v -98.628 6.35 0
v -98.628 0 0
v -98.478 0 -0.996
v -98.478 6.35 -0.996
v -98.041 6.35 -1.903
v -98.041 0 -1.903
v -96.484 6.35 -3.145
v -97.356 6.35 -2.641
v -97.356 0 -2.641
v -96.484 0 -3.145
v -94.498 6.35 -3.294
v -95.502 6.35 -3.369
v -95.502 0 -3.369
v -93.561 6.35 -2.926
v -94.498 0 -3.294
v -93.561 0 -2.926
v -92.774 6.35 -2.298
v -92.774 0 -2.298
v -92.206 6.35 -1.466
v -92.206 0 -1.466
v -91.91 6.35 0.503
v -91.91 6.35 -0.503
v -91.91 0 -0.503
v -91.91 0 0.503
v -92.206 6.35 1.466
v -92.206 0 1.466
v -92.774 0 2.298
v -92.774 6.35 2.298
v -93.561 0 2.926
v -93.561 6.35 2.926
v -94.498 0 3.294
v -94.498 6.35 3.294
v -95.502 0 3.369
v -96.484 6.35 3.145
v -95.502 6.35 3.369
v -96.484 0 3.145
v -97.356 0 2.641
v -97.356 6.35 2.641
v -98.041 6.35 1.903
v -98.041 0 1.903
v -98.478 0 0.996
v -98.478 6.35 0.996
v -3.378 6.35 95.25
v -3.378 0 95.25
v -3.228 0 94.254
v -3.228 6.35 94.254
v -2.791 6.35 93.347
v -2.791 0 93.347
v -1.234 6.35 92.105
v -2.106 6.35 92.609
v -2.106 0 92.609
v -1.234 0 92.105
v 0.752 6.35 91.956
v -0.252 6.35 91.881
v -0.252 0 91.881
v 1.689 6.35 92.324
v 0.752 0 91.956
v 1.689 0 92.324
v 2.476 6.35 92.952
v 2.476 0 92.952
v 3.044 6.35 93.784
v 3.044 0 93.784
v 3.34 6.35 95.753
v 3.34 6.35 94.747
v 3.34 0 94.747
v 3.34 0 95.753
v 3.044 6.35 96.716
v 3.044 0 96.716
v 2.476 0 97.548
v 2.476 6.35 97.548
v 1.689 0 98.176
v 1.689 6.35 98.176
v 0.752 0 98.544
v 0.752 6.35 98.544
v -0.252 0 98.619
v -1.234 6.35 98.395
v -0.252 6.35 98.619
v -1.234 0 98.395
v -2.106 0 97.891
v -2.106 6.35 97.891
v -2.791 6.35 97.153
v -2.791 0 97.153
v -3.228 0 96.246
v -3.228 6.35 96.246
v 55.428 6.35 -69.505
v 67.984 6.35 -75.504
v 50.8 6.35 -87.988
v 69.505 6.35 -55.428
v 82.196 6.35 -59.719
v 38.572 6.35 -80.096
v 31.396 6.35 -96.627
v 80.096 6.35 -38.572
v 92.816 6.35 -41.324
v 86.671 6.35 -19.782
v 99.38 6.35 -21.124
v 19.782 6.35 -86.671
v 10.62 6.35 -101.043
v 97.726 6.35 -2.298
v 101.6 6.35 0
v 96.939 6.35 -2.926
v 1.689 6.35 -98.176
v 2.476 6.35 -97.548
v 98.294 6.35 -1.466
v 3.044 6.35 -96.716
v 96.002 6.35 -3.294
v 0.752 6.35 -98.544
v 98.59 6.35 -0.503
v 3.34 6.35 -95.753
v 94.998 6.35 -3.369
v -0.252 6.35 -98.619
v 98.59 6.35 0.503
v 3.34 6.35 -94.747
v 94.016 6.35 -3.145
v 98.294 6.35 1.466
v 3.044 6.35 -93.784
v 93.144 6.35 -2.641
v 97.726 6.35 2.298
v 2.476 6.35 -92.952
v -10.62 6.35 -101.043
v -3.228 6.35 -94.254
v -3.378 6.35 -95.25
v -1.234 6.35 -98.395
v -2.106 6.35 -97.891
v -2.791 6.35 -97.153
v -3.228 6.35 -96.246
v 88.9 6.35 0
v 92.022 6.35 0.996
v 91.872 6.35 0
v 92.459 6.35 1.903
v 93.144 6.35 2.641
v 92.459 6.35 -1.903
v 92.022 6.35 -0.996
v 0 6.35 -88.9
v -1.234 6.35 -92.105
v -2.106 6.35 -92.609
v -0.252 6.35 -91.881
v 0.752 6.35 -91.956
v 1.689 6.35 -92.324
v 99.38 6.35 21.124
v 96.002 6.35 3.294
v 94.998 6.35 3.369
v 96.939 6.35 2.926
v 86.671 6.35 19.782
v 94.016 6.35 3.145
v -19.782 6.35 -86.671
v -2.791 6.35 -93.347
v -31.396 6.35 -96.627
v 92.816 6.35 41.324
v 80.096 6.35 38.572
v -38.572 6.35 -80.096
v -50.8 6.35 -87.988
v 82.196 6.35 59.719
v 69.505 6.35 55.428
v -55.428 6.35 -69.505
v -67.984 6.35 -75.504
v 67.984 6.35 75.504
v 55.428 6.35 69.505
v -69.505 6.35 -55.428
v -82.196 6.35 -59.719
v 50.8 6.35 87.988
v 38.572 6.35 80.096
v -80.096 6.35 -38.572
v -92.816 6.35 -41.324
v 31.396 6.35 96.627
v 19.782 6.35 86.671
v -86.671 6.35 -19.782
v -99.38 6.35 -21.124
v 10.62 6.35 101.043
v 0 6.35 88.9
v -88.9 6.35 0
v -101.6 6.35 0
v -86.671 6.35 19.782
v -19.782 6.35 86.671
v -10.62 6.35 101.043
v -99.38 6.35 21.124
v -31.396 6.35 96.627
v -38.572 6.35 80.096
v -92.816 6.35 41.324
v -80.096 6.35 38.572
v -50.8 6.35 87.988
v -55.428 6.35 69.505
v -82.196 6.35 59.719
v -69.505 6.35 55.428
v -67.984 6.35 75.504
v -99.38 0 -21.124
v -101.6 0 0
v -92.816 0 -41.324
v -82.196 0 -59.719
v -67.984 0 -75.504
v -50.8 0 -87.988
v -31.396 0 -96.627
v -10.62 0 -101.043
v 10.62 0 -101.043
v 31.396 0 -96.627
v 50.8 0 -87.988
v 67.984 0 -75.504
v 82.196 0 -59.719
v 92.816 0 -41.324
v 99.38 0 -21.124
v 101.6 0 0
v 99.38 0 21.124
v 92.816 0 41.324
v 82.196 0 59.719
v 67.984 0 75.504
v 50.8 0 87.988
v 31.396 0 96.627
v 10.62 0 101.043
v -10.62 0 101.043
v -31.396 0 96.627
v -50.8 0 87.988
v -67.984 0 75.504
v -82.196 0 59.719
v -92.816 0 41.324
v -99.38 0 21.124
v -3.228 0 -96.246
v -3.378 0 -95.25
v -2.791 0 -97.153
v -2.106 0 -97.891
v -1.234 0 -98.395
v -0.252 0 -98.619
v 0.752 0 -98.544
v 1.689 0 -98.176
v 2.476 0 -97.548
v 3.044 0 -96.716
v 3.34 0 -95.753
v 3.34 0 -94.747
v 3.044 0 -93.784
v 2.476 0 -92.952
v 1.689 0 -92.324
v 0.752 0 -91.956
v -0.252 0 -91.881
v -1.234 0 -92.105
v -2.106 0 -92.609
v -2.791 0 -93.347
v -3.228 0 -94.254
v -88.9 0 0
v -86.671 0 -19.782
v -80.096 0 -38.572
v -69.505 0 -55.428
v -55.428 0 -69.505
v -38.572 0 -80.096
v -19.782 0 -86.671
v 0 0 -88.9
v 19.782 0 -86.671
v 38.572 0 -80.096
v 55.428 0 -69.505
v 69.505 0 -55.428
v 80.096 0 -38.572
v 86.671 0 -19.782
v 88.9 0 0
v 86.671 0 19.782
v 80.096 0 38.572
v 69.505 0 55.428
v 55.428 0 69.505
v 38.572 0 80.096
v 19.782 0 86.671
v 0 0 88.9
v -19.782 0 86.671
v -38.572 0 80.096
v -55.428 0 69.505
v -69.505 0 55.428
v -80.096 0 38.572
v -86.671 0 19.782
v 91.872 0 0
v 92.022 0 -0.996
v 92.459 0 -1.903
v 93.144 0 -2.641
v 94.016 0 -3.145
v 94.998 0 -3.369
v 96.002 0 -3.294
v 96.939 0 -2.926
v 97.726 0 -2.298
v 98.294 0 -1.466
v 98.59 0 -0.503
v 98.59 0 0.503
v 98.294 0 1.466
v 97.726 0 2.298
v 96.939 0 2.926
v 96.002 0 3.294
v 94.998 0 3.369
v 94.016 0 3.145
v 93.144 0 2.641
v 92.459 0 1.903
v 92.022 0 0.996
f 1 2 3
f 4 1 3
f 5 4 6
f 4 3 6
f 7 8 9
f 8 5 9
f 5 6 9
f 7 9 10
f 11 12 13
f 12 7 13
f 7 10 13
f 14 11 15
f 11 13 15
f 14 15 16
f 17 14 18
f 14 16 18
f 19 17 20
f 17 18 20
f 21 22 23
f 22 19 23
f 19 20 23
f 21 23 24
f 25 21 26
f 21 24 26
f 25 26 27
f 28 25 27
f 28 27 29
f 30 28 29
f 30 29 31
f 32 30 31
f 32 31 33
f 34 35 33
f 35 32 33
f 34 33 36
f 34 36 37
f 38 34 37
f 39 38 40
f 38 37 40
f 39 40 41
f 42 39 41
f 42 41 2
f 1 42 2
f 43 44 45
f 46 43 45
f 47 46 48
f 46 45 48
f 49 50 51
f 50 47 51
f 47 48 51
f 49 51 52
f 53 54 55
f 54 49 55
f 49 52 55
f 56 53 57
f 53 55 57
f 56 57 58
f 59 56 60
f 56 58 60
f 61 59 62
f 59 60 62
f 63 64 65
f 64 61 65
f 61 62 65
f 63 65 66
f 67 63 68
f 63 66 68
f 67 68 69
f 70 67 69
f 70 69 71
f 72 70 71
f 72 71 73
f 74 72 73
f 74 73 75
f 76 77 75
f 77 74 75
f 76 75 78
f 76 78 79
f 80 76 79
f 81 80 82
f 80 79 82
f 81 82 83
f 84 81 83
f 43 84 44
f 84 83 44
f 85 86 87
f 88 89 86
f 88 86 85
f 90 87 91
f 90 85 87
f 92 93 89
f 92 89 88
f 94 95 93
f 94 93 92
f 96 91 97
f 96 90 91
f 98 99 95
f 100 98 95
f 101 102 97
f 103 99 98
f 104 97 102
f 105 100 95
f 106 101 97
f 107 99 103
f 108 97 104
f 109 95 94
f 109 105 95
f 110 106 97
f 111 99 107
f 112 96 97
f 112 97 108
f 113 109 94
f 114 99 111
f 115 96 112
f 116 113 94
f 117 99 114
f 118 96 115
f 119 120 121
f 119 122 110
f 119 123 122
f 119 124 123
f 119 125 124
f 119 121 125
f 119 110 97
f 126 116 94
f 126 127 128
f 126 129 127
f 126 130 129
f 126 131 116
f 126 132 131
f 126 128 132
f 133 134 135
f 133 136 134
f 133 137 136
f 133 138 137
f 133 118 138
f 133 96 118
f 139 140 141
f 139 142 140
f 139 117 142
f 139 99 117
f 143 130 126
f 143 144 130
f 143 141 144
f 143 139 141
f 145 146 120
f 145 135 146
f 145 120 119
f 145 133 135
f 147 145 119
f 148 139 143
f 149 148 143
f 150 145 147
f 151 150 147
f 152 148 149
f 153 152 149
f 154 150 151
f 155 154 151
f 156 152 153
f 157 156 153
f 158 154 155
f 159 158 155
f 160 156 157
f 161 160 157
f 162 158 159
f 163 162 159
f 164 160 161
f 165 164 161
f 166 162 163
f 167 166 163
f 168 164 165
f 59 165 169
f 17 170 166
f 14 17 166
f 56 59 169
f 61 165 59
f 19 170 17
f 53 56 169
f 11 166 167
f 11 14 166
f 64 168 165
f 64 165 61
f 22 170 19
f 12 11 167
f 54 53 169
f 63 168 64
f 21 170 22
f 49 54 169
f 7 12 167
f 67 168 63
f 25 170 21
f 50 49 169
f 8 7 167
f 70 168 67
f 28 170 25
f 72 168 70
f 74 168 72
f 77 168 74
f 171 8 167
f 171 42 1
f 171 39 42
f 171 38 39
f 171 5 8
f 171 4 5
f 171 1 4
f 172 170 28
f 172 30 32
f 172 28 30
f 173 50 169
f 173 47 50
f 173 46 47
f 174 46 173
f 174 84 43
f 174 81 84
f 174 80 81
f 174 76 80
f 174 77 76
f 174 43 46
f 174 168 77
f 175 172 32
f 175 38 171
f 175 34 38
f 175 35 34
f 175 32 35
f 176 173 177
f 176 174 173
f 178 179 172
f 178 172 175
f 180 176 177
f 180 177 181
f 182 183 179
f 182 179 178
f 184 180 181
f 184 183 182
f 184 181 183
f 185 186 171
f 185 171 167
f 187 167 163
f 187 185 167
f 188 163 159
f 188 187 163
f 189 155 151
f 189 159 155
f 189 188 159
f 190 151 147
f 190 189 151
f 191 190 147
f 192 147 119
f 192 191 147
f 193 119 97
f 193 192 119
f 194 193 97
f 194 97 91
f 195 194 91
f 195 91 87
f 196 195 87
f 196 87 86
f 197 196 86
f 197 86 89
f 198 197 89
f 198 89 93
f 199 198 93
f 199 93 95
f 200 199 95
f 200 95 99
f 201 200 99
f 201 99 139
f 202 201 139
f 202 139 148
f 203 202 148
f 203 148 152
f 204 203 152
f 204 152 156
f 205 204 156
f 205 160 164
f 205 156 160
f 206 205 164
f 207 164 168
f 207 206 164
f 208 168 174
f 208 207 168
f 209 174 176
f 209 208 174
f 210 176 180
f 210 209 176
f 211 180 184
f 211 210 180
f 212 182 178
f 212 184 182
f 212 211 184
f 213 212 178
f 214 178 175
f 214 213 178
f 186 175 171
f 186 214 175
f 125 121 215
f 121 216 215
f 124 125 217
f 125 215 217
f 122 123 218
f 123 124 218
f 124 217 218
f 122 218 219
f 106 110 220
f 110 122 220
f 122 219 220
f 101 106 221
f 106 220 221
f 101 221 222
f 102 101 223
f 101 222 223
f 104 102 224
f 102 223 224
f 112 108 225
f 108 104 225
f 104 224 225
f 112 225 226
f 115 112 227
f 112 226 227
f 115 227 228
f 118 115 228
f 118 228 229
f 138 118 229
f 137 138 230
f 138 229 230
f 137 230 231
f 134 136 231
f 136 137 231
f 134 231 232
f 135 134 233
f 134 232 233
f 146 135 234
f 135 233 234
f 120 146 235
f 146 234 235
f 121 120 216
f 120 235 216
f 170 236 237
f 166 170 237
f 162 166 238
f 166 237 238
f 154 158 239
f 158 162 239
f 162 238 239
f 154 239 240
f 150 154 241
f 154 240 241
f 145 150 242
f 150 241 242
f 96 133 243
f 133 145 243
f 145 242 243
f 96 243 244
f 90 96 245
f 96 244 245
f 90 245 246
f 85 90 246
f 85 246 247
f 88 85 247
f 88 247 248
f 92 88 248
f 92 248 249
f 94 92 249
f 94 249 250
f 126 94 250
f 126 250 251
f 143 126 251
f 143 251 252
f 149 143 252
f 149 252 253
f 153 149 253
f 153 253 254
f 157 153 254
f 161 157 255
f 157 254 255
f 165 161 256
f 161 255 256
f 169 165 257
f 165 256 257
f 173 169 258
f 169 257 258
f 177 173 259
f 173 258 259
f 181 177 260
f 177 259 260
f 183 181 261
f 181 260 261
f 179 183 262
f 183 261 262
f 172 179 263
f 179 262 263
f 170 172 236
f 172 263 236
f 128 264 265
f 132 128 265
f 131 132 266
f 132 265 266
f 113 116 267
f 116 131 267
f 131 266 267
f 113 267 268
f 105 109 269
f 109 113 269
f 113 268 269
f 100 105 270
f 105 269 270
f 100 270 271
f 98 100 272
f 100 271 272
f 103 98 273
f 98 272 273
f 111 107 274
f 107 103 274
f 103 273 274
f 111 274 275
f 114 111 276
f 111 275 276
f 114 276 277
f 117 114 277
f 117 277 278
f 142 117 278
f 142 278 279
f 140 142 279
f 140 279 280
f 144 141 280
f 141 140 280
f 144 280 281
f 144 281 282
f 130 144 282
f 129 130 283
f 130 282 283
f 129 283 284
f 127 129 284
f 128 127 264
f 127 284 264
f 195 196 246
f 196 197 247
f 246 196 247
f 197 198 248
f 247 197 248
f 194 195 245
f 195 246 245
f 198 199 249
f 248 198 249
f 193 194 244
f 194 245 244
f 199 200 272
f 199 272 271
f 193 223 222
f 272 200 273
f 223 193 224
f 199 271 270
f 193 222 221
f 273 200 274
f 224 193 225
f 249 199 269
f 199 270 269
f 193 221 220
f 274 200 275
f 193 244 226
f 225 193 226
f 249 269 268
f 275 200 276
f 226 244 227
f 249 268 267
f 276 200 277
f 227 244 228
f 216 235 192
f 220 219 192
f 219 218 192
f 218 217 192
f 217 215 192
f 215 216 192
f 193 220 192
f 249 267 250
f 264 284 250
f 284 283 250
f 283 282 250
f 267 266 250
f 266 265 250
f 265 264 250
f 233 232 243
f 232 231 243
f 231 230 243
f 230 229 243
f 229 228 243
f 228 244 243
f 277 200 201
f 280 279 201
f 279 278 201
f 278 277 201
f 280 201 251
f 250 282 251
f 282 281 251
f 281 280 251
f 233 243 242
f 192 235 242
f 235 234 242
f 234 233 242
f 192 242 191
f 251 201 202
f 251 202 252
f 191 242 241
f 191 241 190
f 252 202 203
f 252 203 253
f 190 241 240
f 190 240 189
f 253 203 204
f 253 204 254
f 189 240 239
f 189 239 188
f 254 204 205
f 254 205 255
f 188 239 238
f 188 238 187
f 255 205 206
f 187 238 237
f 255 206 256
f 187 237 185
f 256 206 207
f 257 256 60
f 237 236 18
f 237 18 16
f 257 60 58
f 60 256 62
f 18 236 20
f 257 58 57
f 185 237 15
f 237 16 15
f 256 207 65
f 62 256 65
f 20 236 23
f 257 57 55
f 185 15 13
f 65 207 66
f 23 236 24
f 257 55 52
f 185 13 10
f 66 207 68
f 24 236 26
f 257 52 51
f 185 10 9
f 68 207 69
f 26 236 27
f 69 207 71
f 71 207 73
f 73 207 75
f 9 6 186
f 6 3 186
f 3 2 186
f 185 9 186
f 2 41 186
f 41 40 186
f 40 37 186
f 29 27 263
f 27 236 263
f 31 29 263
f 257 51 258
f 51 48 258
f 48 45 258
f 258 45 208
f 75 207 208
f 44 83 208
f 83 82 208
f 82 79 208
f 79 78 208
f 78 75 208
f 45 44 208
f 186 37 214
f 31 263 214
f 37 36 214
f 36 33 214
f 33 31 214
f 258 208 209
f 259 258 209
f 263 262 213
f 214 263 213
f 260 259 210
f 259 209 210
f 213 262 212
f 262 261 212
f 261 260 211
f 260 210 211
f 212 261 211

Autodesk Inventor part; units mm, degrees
ref_plane "YZ Plane" through (0, 0, 0) normal (1, 0, 0) x (0, 1, 0)
ref_plane "XZ Plane" through (0, 0, 0) normal (0, 1, 0) x (-1, 0, 0)
ref_plane "XY Plane" through (0, 0, 0) normal (0, 0, 1) x (1, 0, 0)
sketch "Sketch1" plane through (0, 0, 0) normal (0, 1, 0) x (-1, 0, 0)
  circle A0 centre (0, 0) radius 88.9
  circle A1 centre (0, 0) radius 101.6
  circle A2 centre (0, 0) radius 95.25 construction
  circle A3 centre (0, 95.25) radius 3.3782
  circle A4 centre (-95.25, 0) radius 3.3782
  circle A5 centre (0, -95.25) radius 3.3782
  circle A6 centre (95.25, 0) radius 3.3782
  dimension "d2" = 190.5
  dimension "d0" = 177.8
  dimension "d1" = 203.2
  dimension "d3" = 6.7564
  dimension "d6" = 360
extrude "Extrusion1" add sketch "Sketch1" along normal blind 6.35
properties part number "Flywheel Spacer" material "Aluminum 6061"
